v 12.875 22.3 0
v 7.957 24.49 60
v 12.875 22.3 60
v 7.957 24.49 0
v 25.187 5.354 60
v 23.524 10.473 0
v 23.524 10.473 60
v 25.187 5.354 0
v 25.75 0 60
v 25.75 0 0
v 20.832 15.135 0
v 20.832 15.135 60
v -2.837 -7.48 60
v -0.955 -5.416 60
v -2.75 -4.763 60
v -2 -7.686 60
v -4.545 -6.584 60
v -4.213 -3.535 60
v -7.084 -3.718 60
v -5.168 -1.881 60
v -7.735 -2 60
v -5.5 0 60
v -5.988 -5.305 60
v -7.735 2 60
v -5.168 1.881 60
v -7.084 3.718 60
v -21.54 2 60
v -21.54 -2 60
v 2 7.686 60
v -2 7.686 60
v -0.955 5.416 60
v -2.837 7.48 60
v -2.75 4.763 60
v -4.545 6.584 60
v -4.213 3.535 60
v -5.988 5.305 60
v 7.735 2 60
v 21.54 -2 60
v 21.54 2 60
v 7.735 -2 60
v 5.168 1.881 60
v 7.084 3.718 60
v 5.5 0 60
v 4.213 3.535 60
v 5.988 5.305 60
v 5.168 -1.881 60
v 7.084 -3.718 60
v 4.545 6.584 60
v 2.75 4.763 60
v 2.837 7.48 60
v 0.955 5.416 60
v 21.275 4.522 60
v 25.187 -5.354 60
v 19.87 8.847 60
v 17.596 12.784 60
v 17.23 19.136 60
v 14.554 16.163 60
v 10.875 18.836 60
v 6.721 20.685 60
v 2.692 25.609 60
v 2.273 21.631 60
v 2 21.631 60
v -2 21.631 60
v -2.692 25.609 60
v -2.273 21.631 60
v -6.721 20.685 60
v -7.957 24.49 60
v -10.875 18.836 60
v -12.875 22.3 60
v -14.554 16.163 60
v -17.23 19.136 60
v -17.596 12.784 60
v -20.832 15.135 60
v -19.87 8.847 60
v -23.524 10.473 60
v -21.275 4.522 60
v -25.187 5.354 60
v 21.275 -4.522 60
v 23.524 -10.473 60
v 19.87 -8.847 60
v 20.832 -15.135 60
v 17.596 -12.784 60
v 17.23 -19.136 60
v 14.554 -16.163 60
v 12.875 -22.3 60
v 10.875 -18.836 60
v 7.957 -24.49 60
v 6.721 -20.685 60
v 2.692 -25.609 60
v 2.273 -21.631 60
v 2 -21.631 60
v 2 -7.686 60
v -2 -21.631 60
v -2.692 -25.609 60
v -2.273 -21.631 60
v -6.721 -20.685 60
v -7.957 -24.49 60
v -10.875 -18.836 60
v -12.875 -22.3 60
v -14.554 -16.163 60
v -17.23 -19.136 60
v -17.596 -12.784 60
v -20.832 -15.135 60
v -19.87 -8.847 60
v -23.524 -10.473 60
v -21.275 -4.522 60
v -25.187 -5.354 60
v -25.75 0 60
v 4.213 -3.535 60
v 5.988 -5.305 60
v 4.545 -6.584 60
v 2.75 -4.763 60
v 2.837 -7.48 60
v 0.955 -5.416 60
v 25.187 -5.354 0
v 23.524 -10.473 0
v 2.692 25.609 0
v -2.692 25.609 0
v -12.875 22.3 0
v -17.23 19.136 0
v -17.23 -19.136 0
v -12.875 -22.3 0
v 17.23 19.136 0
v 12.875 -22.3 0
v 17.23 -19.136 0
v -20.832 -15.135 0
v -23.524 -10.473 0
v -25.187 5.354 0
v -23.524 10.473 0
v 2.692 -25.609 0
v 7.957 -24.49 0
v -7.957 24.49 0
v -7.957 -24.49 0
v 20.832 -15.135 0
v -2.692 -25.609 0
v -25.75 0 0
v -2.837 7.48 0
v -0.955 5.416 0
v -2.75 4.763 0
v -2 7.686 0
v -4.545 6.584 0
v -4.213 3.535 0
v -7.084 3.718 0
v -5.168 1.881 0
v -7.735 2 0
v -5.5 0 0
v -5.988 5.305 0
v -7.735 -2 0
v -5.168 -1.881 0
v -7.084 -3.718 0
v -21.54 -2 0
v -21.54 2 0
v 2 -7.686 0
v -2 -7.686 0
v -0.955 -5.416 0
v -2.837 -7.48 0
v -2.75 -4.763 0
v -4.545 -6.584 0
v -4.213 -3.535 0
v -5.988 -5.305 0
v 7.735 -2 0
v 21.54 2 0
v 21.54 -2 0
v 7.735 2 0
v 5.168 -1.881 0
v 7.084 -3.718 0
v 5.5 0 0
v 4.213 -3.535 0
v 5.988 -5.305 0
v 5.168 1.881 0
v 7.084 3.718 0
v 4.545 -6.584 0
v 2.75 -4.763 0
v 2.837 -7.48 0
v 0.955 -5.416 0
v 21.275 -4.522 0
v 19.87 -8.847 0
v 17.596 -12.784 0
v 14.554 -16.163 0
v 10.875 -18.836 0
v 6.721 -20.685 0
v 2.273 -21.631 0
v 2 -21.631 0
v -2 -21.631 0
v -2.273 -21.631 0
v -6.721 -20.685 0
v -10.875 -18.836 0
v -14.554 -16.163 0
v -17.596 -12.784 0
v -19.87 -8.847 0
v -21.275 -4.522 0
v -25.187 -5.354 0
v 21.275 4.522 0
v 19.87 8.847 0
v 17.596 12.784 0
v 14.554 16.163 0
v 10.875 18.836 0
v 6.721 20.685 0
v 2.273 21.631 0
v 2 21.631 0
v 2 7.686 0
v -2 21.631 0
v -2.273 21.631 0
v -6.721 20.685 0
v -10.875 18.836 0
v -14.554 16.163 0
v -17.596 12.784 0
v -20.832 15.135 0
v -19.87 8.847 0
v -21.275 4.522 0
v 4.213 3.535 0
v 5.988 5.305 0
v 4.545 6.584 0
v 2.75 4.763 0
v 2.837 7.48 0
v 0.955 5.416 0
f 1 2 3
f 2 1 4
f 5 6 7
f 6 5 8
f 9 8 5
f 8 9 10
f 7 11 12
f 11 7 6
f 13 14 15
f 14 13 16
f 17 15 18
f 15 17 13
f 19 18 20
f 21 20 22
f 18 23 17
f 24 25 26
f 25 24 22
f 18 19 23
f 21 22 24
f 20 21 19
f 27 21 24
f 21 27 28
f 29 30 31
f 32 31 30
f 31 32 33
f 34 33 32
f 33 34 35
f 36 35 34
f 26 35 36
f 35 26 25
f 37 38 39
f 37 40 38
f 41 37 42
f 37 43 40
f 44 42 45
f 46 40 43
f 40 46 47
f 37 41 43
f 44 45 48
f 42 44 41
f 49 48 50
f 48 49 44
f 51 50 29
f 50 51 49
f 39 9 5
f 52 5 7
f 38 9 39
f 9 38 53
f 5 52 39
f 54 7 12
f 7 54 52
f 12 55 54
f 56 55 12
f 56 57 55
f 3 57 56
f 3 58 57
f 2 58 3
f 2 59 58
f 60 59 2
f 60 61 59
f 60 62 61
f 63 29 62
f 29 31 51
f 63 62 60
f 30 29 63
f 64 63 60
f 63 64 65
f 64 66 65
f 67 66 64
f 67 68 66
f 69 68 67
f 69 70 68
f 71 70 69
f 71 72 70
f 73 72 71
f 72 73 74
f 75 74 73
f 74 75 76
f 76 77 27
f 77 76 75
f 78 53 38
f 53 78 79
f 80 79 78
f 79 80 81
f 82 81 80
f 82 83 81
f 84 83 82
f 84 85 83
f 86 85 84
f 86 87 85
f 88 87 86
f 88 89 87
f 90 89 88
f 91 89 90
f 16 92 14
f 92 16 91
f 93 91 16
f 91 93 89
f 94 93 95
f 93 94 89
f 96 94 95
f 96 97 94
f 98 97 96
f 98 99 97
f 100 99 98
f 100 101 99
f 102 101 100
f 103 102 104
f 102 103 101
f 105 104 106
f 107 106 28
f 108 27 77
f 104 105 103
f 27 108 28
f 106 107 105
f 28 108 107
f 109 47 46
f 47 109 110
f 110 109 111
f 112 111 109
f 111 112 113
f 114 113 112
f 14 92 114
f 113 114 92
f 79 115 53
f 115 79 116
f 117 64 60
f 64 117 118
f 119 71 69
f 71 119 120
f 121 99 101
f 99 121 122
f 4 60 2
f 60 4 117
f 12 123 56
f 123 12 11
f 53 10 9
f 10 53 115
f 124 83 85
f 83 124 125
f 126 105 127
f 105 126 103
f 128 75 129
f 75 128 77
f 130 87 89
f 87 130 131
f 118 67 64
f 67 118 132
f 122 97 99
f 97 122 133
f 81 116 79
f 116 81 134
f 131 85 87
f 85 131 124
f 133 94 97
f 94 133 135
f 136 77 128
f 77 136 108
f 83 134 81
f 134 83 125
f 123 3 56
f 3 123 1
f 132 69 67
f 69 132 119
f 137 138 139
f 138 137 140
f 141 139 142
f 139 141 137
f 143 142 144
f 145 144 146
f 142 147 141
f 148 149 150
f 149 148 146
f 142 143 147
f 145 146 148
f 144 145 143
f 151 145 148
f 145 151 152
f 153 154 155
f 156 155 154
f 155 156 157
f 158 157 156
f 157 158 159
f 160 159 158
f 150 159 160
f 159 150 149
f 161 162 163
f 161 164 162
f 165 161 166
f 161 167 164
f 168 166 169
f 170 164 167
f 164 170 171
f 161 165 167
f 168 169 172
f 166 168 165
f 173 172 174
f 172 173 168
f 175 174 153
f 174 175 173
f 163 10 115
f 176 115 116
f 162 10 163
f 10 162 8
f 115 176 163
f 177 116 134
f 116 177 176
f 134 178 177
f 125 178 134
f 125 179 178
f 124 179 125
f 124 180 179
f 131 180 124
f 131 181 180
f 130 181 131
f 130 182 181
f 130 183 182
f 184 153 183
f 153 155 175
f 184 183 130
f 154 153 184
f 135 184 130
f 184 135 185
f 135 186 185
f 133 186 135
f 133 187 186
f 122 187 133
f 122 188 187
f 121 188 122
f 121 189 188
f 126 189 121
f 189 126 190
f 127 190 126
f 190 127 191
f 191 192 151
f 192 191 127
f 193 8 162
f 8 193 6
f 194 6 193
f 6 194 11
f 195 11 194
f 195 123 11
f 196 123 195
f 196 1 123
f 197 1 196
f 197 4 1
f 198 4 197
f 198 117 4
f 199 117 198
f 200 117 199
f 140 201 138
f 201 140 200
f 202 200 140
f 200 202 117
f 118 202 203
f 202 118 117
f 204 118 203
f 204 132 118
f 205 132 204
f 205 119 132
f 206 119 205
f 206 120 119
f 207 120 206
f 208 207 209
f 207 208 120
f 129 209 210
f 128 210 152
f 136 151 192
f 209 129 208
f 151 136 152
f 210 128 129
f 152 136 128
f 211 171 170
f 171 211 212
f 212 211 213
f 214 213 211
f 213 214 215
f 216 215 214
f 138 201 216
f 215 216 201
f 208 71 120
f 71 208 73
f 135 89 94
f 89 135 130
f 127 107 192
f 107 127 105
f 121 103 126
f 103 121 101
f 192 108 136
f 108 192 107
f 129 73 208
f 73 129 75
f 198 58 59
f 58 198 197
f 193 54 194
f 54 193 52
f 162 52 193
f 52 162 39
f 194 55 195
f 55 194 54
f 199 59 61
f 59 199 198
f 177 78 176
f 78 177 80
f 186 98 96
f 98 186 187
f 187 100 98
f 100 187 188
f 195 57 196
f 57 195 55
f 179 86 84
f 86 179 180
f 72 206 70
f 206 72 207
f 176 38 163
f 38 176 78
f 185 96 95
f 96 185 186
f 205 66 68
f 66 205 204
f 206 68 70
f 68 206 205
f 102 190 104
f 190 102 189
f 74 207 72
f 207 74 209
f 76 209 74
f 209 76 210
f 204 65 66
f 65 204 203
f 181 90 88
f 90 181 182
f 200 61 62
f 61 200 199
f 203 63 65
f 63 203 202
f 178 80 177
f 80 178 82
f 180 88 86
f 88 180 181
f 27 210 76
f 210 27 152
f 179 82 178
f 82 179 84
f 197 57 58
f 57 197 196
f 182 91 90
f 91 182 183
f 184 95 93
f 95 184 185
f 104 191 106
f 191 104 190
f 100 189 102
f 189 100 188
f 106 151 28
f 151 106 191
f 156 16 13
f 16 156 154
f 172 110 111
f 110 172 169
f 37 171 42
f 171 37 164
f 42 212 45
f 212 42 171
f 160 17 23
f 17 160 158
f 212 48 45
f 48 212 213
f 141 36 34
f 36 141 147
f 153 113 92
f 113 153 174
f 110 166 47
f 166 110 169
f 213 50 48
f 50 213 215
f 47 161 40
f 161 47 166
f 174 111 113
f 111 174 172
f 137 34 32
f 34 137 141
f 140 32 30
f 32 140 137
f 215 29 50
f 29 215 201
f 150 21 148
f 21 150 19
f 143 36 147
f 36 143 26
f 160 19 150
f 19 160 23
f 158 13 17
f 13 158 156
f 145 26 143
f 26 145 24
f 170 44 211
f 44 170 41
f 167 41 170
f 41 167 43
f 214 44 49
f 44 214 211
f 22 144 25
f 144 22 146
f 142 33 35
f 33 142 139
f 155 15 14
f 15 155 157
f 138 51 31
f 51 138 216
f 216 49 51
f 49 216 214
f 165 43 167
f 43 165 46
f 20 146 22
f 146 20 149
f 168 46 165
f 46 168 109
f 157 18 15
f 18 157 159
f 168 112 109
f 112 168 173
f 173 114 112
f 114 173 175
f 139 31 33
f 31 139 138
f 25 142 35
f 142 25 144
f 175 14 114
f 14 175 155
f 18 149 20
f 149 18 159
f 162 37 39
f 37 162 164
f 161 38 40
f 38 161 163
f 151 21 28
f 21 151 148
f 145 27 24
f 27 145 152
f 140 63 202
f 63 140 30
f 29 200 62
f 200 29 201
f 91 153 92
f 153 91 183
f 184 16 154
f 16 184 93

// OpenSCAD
//Height of the drum
height=60;
//diameter of the spool
diameter=51.5;


difference(){
cylinder(h = height, r1 = diameter/2, r2 = diameter/2,center=false); 
cylinder(h = height, r1=diameter/2-4, r2=diameter/2-4, center=false);
}

difference(){
cylinder(h = height, r1 = 16/2, r2 = 16/2,center=false); 
cylinder(h = height, r1 = 11/2, r2 = 11/2,center=false);     
}

translate([6,-2,0])
cube([(diameter/2-8.5),4,60],center=false);
rotate([0,0,180]){
    translate([6,-2,0])
    cube([diameter/2-8.5,4,60],center=false);}
rotate([0,0,90]){
    translate([6,-2,0])
    cube([diameter/2-8.5,4,60],center=false);}
rotate([0,0,-90]){
    translate([6,-2,0])
    cube([diameter/2-8.5,4,60],center=false);}
